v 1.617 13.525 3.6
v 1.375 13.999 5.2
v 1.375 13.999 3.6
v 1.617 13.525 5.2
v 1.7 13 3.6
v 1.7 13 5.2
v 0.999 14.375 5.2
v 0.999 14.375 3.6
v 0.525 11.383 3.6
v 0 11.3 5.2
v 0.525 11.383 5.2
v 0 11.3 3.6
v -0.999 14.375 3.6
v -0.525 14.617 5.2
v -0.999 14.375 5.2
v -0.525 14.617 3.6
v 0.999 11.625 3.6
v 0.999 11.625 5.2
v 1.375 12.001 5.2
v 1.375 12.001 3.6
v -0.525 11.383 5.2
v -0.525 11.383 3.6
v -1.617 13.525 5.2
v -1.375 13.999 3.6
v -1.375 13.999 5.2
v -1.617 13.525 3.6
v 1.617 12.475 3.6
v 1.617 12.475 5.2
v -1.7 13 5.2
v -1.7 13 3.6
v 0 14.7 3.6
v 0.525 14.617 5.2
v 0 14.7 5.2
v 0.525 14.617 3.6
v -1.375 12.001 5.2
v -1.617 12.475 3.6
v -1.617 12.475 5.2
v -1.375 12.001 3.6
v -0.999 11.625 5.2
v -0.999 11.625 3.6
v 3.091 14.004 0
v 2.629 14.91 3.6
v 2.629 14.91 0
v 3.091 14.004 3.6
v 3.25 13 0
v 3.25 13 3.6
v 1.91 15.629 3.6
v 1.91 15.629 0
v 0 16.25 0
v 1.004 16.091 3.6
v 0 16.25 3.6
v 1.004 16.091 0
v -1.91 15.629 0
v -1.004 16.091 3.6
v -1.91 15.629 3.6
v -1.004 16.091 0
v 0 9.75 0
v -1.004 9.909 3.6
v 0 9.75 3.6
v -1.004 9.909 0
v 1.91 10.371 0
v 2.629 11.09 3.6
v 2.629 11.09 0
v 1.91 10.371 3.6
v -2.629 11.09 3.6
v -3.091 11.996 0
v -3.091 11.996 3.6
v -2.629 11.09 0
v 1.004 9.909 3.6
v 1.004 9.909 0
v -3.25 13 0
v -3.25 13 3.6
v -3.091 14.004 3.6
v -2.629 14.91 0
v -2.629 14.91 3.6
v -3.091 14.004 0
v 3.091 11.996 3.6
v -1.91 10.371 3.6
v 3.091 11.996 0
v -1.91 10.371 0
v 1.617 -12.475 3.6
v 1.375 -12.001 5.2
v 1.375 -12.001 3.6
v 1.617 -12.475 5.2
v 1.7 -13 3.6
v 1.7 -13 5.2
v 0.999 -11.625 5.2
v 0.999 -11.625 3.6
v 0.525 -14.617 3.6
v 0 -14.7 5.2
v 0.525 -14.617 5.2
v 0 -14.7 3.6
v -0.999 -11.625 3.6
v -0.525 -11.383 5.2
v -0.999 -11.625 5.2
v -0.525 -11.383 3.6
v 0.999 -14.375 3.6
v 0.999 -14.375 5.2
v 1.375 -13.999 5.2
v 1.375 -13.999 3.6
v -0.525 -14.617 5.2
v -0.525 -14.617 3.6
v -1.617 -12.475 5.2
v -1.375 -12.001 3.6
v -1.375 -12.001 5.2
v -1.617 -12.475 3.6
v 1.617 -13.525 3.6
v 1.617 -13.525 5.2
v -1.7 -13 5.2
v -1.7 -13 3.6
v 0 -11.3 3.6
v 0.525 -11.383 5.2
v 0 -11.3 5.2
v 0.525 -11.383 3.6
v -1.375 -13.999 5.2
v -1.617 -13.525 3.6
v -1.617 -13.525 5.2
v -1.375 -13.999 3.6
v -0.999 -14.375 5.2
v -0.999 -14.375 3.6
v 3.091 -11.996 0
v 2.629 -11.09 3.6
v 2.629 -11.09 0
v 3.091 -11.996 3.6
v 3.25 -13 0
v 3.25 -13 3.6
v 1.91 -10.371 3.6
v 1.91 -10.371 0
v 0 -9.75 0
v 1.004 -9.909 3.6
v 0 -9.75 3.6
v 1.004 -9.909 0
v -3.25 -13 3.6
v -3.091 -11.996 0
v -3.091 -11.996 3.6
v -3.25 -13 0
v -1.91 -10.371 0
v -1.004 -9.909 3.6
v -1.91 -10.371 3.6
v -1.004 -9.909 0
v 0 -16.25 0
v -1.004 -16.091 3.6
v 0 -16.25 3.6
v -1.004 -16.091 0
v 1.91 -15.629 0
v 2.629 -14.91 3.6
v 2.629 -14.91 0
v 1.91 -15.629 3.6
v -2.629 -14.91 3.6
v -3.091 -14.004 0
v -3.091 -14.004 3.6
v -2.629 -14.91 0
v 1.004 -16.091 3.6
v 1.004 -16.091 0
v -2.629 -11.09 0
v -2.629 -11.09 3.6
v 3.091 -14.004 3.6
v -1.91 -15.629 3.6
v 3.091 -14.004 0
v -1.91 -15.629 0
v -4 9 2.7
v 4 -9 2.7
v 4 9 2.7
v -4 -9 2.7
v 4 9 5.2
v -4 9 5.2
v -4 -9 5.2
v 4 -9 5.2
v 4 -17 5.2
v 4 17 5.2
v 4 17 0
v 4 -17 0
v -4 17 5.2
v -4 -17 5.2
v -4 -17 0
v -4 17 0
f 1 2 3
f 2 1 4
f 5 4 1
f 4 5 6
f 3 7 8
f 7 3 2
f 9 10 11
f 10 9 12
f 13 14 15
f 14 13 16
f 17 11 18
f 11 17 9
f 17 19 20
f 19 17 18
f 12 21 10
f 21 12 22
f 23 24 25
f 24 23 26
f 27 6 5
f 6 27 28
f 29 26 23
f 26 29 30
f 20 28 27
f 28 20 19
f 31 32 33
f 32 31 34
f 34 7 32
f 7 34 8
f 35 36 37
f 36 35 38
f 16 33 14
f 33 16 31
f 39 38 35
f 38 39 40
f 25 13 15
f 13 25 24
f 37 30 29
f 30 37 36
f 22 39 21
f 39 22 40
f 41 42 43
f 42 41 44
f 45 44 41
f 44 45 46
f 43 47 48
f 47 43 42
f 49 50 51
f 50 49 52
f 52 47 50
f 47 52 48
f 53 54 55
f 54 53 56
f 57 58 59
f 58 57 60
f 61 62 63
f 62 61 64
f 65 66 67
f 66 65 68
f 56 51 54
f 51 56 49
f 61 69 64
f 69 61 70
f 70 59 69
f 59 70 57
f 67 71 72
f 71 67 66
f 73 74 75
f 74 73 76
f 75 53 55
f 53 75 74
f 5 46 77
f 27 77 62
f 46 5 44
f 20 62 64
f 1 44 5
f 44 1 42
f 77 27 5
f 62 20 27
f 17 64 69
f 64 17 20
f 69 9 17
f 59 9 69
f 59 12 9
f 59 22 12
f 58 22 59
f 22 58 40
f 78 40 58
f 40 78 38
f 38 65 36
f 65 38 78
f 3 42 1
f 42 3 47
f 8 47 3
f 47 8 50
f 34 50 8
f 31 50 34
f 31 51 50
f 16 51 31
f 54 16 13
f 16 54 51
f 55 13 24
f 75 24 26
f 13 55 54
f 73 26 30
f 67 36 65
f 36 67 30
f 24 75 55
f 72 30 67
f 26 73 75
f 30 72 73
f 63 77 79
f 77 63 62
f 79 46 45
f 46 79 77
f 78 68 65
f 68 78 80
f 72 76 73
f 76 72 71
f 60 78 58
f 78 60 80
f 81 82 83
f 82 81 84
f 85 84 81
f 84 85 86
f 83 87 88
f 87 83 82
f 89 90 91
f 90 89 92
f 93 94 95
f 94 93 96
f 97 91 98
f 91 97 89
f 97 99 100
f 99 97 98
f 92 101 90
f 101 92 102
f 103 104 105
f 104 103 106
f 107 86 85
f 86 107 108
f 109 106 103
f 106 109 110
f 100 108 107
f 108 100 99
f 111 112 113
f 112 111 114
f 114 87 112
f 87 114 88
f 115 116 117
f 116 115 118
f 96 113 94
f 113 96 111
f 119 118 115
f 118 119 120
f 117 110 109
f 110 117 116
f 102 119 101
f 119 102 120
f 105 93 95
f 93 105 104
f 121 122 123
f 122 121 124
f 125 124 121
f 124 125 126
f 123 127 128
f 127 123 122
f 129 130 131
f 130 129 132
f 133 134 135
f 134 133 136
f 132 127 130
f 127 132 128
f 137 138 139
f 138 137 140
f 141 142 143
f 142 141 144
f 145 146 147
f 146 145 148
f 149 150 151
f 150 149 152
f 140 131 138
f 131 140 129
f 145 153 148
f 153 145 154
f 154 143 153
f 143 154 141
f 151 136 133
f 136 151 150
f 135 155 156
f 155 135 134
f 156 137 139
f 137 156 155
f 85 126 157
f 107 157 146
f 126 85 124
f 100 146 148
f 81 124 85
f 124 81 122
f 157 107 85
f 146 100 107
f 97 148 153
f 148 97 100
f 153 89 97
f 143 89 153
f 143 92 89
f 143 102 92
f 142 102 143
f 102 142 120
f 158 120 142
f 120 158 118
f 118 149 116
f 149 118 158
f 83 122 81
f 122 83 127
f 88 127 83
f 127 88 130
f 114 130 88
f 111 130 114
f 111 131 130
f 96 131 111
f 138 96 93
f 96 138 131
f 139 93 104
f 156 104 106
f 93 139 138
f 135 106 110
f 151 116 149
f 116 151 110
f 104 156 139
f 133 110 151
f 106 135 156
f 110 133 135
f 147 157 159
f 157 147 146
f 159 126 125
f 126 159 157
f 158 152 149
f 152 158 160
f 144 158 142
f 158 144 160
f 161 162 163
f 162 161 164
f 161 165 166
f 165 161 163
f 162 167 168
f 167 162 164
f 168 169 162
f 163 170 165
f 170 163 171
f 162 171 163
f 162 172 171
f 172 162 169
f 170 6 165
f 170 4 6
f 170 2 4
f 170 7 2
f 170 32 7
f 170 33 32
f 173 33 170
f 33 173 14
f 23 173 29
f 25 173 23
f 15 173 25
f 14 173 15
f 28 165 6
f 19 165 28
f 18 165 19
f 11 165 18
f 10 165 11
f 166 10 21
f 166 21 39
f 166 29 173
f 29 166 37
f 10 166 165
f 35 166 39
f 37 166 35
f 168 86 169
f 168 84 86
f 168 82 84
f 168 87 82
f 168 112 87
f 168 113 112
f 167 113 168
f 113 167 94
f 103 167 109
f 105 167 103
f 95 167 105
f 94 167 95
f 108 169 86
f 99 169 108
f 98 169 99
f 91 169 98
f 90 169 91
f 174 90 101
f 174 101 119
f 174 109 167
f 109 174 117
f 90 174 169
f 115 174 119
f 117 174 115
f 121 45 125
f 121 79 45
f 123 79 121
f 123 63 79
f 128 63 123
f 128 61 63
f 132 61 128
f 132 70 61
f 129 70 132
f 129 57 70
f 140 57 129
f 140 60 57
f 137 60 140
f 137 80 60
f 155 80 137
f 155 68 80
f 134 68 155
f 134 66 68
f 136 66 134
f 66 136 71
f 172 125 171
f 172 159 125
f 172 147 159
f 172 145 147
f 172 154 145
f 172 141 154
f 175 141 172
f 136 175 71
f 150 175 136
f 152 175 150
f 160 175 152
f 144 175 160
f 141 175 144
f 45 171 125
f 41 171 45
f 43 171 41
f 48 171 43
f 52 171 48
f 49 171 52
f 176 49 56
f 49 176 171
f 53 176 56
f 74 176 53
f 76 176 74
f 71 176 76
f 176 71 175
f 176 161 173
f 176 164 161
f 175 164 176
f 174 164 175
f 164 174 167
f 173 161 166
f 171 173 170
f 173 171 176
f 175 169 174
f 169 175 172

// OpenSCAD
// file: lib/lidar.scad
module lidarServoHolder() {
    length = 23.5;
    breadth = 12.7;
    height = 16;
    tabThickness = 4.5;
    screwHoleDistance = 28;
    screwDiameter = 2.4;
    screwHeight = 10;
    wallThickness = 1;
    totalLength = length+2*tabThickness;
    totalBreath = breadth+2*wallThickness;
    connectorWidth = 4;

    translate([-totalLength/2, 0, 0]) {
        difference() {
            translate([0, -totalBreath/2, 0]) {
                cube([totalLength, totalBreath, height+2*plateThickness]);
            }
            union() {
                translate([tabThickness, -totalBreath/2+wallThickness,
                           plateThickness+iota]) {
                    cube([length, breadth, height+plateThickness]);
                }
                for (dx = [-screwHoleDistance/2, screwHoleDistance/2]) {
                    translate([totalLength/2+dx, 0,
                               height+2*plateThickness-screwHeight+iota]) {
                        cylinder(d = screwDiameter, h = screwHeight, $fn=20);
                    }
                }
                translate([-iota, 0, plateThickness+iota]) {
                    scale([1, 1.5, 1]) {
                        difference() {
                            rotate([0, 90, 0]) {
                                cylinder(d = 2*connectorWidth,
                                         h = tabThickness+2*iota, $fn=40);
                            }
                            translate([-iota, -connectorWidth, -connectorWidth]) {
                                cube([tabThickness+4*iota,
                                      2*connectorWidth, connectorWidth]);
                            }
                        }
                    }
                }
            }
        }
    }
}

hornDiameter = 8;
hornHeight = 4;
hornHoleDepth = 2.5;
hornHoleSquareWidth = 3.5;
hornScrewDiameter = 3;
hornScrewHeadDiameter = 6.5;
headMountScrewOffset = 6.4;
connectorWidth = 18;
connectorHeight = 2.6;
screwHeadThickness = 1.5;
headLength = connectorWidth + 2*hornDiameter;
headHeight = screwLength - screwHeadThickness + 0.5;
headEdgeOffset = (headLength - 2*headMountScrewOffset)/2;
headMountScrewDiameter = 2;
headHoleOffset = headLength/2 - hornDiameter/2;


// screwLength = 9.3;
// screwHoleDiameter = 2.75;
// screwBodyDiameter = 3.4;


module servoAdd() {
    cylinder(d=hornDiameter, h=hornHeight, $fn=35);
}

module servoDel() {
    union() {
        translate([0, 0, -iota]) {
            cylinder(d=hornScrewDiameter, h=hornHeight+2*iota, $fn=20);
        }
        for (r = [0 : 90.0/5 : 90]) {
            rotate([0, 0, r]) {
                translate([-hornHoleSquareWidth/2, -hornHoleSquareWidth/2,
                        hornHeight-hornHoleDepth+iota]) {
                    cube([hornHoleSquareWidth, hornHoleSquareWidth, hornHoleDepth]);
                }
            }
        }
    }
}

module lidarHeadPart1() {
    translate([0, 0, headHeight]) {
        difference() {
            servoAdd();
            servoDel();
        }
    }
    difference() {
        translate([-hornDiameter/2, -headLength/2, 0]) {
            cube([hornDiameter, headLength, headHeight]);
        }
        union() {
            translate([0, 0, -iota]) {
                cylinder(d = hornScrewHeadDiameter,
                    h = headHeight+2*iota, $fn = 30);
            }
            for (o = [headHoleOffset, -headHoleOffset]) {
                translate([0, o, -iota]) {
                    cylinder(d = screwHoleDiameter,
                        h = screwLength - screwHeadThickness, $fn=20);
                }
            }
        }
    }
}

module lidarHeadPart2() {
    difference() {
        translate([-hornDiameter/2, -headLength/2, 0]) {
            cube([hornDiameter, headLength, 2*connectorHeight]);
        }
        union() {
            translate([-hornDiameter/2-iota,
                      -connectorWidth/2, connectorHeight+iota]) {
                cube([hornDiameter+2*iota, connectorWidth, connectorHeight]);
            }
            for (o = [headHoleOffset, -headHoleOffset]) {
                translate([0, o, -iota]) {
                    cylinder(d = screwBodyDiameter,
                             h = 2*connectorHeight+2*iota, $fn=20);
                    cylinder(d = screwHeadDiameter,
                             h = 2*connectorHeight-screwHeadThickness, $fn=20);
                }
            }
        }
    }
}
// file: lib/stepper.scad
smWidth = 42;
smLength = 40;
smScrewHoleOffsets = 31/2;
smCenterDiameter = 22;
smExtra = 1;

module stepperMotor() {
    smCenterHeight = 2;
    smShaftDiameter = 5;
    smShaftLength = 23;
    smScrewDepth = 4.5;
    smScrewDiameter = 3;
    smEdgeTrimOffset = 27;
    module add() {
        translate([-smWidth/2, -smLength, -smWidth/2]) {
            cube([smWidth, smLength, smWidth]);
        }
        rotate([-90, 0, 0]) {
            cylinder(d=smCenterDiameter, h=smCenterHeight, $fn=30);
            cylinder(d=smShaftDiameter, h=smShaftLength, $fn=20);
        }
    }
    module del() {
        for (x = [smScrewHoleOffsets, -smScrewHoleOffsets]) {
            for (z = [smScrewHoleOffsets, -smScrewHoleOffsets]) {
                translate([x, iota, z]) {
                    rotate([90, 0, 0]) {
                        cylinder(d=smScrewDiameter, h=smScrewDepth, $fn=40);
                    }
                }
            }
        }
        for (a = [45, 135, 225, 315]) {
            rotate([0, a, 0]) {
                translate([smEdgeTrimOffset,
                        -smLength-iota, -smWidth/2-iota]) {
                    cube([smWidth, smLength+2*iota, smWidth+2*iota]);
                }
            }
        }

    }
    difference() {
        add();
        del();
    }
}

module stepperMotorHole() {
    smHoleHeight = 20;
    smScrewHoleDiameter = 4;

    widthPlusExtra = smWidth + smExtra;
    lengthPlusExtra = smLength + smExtra/2;

    translate([-smWidth/2, -lengthPlusExtra, -widthPlusExtra/2]) {
        cube([smWidth, lengthPlusExtra, widthPlusExtra]);
    }
    translate([0, -iota, 0]) {
        rotate([-90, 0, 0]) {
            cylinder(d=smCenterDiameter+smExtra, h=smHoleHeight, $fn=40);
        }
    }
    for (x = [smScrewHoleOffsets, -smScrewHoleOffsets]) {
        for (z = [smScrewHoleOffsets, -smScrewHoleOffsets]) {
            translate([x, smHoleHeight-iota, z]) {
                rotate([90, 0, 0]) {
                    cylinder(d=smScrewHoleDiameter, h=smHoleHeight, $fn=40);
                }
            }
        }
    }

}
// file: lib/commonConstants.scad
// A small quantity to keep parts from starting or ending at exactly the
// same location. For example when we create a hole through an object we
// want the object being subtracted to stick slightly past the object being
// subtracted from.
iota = 0.1;


// Length and hole diameter of the #4 x 3/8in Phillips mount screw.
screwLength = 9.3;
screwHoleDiameter = 2.75;
screwHeadDiameter = 6.5;
screwBodyDiameter = 3.4;


// These constants are the basic parameters of the mount plate. They are
// necessary for other components to make their calculations.
mountPlateWidth = 37.6;
mountPlateLength = 51;


// These constants are the basis for the carbon fiber mount points. They are
// necessary for other components to make their calculations.
mountRodDiameter = 5.5;         // A little extra because holes are smaller.
mountThickness = 9;
mountDiameter = mountRodDiameter + 2*mountThickness;


// These constasnts are teh basis for the motor base. They are necessary for
// other components to make their calculations.
motorBaseExtraAxisOffset = 5;
motorBaseTopOffset = sqrt(3)*mountPlateWidth/6 + motorBaseExtraAxisOffset;
motorBaseBottomOffset = mountPlateLength/sqrt(2) + motorBaseTopOffset;
motorBaseBottomRadius = sqrt(pow(motorBaseBottomOffset,2) +
                             pow(mountPlateWidth/2, 2));
mountBaseRodOffsets = motorBaseBottomRadius-mountDiameter/2;
// main file
include <lib/commonConstants.scad>;
include <lib/stepper.scad>;
include <lib/commonMounts.scad>;
include <lib/lidar.scad>;

lidarHeadPart2();
